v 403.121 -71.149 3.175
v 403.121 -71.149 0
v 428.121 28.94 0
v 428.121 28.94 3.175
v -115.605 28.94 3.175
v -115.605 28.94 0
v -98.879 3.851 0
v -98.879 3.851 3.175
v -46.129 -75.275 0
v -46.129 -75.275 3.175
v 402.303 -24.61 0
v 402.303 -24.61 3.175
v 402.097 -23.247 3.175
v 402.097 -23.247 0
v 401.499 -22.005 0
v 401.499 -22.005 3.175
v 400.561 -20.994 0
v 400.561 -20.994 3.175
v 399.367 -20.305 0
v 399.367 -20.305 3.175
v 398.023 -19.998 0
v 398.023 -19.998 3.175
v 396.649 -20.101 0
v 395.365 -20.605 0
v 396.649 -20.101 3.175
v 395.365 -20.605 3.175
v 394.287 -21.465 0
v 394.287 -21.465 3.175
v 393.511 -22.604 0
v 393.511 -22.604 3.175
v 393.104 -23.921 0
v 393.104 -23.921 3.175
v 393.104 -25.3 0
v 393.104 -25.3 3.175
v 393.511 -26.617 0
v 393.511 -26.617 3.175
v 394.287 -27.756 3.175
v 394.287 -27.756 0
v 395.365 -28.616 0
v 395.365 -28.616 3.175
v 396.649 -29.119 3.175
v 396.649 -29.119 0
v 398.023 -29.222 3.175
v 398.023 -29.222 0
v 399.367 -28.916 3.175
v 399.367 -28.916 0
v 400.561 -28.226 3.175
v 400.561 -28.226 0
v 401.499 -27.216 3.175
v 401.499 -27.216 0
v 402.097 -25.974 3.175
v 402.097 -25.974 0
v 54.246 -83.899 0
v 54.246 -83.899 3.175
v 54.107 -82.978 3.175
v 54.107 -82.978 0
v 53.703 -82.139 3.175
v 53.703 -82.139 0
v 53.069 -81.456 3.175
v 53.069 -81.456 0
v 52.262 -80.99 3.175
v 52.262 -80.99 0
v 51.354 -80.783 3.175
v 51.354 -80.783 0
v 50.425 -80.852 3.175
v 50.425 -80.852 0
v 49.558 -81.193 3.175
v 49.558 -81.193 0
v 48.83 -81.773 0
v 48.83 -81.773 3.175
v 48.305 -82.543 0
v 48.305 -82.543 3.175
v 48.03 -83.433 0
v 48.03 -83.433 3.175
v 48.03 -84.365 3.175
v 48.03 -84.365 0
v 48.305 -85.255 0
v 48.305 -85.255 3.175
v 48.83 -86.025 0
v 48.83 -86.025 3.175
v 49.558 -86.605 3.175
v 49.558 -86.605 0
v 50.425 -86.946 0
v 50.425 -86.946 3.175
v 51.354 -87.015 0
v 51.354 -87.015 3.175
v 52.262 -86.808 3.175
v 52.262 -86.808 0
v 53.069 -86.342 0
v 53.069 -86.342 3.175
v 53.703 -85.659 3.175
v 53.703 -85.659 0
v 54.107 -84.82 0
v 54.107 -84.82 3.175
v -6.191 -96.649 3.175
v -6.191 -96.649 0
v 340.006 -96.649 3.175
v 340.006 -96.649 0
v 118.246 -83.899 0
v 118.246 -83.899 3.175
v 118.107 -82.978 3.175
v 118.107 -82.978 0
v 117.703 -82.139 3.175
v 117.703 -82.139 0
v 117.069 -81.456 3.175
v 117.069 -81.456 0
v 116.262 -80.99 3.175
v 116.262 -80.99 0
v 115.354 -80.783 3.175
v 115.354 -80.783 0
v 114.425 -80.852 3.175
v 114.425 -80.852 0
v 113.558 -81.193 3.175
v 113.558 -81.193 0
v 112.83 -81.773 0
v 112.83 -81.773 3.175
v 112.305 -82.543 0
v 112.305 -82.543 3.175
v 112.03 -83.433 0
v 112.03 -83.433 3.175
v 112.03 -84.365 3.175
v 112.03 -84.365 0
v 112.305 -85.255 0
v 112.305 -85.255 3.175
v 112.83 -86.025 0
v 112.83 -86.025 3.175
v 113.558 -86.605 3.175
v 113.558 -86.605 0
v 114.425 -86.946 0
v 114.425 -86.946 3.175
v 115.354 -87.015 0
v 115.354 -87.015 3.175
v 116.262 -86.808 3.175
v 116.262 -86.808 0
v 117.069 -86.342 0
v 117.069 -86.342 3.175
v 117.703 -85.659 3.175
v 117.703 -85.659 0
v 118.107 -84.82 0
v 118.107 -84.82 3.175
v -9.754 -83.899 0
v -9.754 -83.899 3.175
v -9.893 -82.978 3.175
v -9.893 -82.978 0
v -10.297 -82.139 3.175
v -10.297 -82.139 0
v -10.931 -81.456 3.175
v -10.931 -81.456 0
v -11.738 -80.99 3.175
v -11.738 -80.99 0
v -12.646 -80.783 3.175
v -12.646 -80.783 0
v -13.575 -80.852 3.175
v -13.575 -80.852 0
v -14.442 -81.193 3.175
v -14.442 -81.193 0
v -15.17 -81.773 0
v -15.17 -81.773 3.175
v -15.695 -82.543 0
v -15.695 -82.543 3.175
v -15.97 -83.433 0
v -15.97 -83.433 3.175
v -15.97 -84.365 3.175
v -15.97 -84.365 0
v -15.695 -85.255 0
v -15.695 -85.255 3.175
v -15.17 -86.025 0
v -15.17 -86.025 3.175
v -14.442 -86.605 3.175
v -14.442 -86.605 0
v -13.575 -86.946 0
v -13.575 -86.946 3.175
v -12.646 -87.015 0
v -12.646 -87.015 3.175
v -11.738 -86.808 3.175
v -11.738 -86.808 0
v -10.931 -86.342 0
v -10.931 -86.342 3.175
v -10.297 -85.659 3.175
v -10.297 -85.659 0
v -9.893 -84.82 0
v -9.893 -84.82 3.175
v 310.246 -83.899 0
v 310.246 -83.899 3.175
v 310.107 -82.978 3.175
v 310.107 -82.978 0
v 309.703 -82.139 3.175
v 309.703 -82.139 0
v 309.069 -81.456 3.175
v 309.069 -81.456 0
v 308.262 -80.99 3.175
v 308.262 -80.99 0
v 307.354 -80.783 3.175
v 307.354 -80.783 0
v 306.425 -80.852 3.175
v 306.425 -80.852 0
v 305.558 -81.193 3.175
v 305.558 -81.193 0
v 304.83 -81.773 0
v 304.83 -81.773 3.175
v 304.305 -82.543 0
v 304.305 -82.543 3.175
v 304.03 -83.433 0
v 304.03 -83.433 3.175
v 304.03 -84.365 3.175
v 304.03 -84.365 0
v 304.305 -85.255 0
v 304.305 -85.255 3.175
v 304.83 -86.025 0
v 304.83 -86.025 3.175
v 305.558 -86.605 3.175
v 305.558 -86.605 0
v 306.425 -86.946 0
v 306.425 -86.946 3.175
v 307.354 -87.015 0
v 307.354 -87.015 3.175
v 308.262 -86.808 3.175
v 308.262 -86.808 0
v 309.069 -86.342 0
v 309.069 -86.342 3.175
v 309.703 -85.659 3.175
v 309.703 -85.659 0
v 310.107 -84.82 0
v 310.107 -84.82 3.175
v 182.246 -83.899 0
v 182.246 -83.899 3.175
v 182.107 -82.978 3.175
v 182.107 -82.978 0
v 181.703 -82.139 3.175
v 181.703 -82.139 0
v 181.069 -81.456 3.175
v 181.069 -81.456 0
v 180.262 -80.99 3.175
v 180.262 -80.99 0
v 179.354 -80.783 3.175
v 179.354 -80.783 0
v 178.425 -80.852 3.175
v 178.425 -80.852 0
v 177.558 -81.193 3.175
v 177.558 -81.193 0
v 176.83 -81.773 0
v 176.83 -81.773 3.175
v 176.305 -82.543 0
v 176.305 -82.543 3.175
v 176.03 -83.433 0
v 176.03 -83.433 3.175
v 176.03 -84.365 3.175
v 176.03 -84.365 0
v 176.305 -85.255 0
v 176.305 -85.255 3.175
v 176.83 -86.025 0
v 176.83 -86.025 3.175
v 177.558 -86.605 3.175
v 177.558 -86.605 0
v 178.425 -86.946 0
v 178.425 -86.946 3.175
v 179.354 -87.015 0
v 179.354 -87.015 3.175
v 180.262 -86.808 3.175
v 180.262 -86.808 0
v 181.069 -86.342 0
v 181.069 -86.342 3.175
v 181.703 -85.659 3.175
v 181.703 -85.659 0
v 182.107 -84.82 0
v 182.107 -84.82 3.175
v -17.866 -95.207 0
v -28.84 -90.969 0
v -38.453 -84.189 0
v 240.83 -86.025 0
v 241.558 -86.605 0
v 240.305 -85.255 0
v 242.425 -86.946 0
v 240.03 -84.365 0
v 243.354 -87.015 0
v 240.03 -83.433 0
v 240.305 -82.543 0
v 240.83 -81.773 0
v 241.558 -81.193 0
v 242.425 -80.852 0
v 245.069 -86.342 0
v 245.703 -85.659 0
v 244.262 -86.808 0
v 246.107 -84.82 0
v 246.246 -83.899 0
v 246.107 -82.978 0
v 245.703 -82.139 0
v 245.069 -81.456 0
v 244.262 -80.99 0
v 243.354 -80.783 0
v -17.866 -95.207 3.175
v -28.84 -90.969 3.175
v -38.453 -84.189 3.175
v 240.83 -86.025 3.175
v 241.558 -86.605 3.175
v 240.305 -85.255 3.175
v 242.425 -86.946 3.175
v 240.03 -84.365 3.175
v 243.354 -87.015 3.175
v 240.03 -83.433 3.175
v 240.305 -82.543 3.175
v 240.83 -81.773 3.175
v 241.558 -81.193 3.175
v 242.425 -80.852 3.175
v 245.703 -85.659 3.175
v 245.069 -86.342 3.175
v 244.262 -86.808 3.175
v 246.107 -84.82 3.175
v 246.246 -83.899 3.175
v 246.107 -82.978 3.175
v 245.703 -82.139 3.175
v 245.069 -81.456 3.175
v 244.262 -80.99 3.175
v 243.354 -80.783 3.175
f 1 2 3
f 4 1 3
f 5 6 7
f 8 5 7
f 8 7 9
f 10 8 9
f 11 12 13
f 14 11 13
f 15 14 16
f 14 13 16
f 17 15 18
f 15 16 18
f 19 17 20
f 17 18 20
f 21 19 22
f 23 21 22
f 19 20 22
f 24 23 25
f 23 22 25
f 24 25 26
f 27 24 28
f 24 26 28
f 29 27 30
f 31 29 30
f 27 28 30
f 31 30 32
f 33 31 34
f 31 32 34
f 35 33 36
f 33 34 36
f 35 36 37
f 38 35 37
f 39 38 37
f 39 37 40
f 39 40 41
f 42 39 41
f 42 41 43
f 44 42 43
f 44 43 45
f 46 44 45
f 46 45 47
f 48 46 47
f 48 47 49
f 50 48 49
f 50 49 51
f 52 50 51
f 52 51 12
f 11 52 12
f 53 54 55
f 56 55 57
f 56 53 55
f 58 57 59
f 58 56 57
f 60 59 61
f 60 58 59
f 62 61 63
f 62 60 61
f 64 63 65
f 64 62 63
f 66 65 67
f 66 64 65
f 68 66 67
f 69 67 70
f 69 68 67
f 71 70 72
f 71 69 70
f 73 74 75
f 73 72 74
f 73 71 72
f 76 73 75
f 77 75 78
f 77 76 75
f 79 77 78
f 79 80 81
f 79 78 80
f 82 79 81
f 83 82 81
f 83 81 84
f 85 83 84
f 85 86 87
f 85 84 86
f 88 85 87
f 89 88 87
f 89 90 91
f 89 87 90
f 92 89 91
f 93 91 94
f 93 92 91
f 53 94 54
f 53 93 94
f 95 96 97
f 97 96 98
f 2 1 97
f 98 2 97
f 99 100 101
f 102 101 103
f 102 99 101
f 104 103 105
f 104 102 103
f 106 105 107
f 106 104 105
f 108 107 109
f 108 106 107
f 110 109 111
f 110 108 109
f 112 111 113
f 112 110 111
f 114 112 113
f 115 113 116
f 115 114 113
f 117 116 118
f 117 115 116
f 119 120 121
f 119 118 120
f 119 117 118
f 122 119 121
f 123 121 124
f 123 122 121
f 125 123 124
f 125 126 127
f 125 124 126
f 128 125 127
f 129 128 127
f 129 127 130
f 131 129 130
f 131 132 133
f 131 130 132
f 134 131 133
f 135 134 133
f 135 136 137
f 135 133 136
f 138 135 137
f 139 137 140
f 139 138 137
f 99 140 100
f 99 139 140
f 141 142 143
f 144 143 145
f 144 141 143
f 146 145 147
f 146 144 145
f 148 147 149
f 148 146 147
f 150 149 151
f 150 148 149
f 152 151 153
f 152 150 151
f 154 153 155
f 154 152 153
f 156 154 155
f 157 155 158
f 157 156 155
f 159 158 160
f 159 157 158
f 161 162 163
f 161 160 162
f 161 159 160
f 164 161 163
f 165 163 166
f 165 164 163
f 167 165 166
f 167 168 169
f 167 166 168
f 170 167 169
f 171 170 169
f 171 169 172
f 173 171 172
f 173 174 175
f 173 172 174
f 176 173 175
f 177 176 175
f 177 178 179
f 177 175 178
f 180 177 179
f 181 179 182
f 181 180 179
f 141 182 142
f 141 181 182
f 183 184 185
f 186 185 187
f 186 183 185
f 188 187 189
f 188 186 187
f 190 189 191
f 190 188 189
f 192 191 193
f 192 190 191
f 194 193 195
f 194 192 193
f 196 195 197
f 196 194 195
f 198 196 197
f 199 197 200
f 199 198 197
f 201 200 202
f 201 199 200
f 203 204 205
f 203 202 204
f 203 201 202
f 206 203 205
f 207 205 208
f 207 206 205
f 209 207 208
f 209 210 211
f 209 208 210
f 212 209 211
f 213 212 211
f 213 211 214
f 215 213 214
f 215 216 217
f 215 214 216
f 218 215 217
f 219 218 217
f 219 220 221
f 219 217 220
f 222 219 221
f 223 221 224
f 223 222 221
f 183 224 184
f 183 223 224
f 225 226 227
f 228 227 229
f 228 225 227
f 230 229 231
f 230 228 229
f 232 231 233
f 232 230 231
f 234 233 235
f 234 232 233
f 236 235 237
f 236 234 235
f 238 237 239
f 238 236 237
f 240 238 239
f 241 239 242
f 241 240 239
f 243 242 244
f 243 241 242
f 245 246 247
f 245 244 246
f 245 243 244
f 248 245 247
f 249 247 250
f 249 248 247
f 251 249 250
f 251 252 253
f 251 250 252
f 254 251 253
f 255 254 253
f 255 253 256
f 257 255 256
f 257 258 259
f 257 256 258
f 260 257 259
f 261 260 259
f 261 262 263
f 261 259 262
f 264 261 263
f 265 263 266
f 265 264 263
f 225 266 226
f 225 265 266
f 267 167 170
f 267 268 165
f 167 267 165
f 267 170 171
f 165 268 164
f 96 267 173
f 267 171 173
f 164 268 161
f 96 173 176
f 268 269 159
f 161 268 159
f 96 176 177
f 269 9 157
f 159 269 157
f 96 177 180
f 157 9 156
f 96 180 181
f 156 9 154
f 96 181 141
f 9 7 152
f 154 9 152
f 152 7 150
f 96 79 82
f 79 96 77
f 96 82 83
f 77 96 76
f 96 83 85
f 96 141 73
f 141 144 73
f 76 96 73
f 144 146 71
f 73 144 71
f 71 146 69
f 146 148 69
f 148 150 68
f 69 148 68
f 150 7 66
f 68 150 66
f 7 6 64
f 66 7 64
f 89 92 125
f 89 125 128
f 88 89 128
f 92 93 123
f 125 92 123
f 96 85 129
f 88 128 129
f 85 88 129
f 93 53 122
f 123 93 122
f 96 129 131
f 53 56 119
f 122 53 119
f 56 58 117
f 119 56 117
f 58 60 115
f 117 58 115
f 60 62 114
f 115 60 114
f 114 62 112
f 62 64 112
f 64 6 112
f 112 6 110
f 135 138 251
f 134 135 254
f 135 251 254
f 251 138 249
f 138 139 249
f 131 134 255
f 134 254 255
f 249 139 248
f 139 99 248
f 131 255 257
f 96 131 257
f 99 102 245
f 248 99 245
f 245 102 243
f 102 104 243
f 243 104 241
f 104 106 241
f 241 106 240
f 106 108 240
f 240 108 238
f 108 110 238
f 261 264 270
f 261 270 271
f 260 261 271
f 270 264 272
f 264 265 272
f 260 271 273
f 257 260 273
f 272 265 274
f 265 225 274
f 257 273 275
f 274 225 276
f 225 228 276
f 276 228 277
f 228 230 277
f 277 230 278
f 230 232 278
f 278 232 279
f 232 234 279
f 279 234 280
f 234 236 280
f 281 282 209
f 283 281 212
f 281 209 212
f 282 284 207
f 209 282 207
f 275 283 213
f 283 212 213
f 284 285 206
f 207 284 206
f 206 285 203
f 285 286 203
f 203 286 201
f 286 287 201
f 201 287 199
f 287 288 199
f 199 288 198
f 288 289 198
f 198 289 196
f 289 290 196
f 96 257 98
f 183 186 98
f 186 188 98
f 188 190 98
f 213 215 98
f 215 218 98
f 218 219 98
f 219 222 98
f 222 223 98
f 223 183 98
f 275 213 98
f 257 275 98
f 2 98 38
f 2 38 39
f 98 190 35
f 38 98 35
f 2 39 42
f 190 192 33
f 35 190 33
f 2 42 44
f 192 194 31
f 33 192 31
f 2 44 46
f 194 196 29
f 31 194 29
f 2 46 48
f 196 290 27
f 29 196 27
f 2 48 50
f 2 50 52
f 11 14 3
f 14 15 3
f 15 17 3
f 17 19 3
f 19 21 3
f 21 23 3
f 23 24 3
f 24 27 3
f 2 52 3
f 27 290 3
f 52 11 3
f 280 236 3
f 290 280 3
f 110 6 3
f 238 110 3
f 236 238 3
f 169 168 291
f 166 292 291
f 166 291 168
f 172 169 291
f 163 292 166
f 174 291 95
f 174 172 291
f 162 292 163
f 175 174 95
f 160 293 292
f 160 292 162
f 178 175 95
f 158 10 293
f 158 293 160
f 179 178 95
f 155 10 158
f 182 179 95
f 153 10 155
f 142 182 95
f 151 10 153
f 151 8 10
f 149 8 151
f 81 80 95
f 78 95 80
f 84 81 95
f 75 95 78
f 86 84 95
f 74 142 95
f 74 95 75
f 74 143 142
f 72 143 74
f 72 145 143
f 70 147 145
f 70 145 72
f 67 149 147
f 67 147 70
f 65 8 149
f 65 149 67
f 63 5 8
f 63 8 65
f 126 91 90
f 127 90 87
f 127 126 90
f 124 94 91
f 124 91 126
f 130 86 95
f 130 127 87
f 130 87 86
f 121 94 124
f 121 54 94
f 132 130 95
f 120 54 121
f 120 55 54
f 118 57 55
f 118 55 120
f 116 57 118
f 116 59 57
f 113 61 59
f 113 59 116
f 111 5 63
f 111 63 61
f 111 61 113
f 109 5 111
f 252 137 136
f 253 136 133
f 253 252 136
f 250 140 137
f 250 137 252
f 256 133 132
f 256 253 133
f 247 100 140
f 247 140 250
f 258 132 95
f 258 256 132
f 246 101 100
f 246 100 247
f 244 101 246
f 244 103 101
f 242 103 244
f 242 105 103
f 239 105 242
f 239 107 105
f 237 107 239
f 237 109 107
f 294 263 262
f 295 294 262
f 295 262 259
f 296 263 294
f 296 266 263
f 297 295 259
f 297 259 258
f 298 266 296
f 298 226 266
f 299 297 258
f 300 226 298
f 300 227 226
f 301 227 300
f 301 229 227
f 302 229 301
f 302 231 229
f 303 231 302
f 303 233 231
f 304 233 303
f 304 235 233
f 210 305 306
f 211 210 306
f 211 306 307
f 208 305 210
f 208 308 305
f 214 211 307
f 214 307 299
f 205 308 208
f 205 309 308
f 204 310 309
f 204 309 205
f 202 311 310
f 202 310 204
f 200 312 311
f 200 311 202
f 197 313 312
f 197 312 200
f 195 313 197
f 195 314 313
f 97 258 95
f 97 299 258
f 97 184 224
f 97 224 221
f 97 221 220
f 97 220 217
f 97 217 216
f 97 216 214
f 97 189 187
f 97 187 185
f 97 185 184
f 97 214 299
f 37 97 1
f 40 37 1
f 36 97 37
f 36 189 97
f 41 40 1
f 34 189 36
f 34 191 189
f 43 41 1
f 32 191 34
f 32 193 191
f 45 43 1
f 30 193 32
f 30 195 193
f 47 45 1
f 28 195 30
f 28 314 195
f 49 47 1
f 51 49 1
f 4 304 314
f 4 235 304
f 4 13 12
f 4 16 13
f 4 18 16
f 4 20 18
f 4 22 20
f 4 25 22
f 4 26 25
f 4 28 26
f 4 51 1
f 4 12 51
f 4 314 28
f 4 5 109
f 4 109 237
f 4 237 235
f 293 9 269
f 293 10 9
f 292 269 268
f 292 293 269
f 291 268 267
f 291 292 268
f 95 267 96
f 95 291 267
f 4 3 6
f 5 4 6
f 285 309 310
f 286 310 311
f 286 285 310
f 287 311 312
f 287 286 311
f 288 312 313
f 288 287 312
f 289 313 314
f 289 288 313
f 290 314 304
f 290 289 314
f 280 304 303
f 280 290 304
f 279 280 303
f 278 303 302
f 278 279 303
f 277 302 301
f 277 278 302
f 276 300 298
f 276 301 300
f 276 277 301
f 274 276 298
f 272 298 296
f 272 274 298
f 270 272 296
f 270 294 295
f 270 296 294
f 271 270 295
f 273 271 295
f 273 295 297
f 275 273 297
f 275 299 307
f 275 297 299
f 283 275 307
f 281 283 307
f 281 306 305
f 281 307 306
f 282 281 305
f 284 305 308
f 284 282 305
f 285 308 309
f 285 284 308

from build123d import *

# Parameters (mm, degrees)
BOSS_EXTRUDE1_DEPTH = 3.175
SKETCH1_4_R         = 3.125
CUT_EXTRUDE1_DEPTH  = 439.905857431
FILLET1_R           = 48
CUT_EXTRUDE3_DEPTH  = 10
CUT_EXTRUDE5_REACH  = 440.906
SKETCH12_R          = 4.625


with BuildPart() as part:
    # Sketch1 → Boss-Extrude1 (new body)
    with BuildSketch(Plane.XY):
        Polygon((-98.879411765, 3.850980392), (-31.879411765, -96.649019608), (366, -96.649019608), (403.120588235, -71.149019608), (428.120588235, 28.939617947), (-115.605170134, 28.939617947), align=None)
    extrude(amount=BOSS_EXTRUDE1_DEPTH)

    # Sketch1<4> → Cut-Extrude1 (cut, through all)
    with BuildSketch(Plane.XY):
        with Locations((-12.879411765, -83.899019608)):
            Circle(SKETCH1_4_R)
        with Locations((51.120588235, -83.899019608)):
            Circle(SKETCH1_4_R)
        with Locations((115.120588235, -83.899019608)):
            Circle(SKETCH1_4_R)
        with Locations((179.120588235, -83.899019608)):
            Circle(SKETCH1_4_R)
        with Locations((243.120588235, -83.899019608)):
            Circle(SKETCH1_4_R)
        with Locations((307.120588235, -83.899019608)):
            Circle(SKETCH1_4_R)
    extrude(amount=CUT_EXTRUDE1_DEPTH, mode=Mode.SUBTRACT)

    # Fillet1
    fillet1_edges = [part.edges().sort_by_distance(p)[0] for p in [
        (-31.879411765, -96.649019608, 1.5875),
    ]]
    fillet(fillet1_edges, radius=FILLET1_R)

    # Sketch7 → Cut-Extrude3 (cut)
    with BuildSketch(Plane.XY.offset(3.175)):
        Polygon((403.120588235, -71.149019608), (340.005873473, -96.649019608), (366, -96.649019608), align=None)
    extrude(amount=-CUT_EXTRUDE3_DEPTH, mode=Mode.SUBTRACT)

    # Sketch12 → Cut-Extrude5 (cut, up to next)
    with BuildSketch(Plane.XY.offset(3.175), mode=Mode.PRIVATE) as cut_extrude5_sk1:
        with Locations((397.677759779, -24.610405856)):
            Circle(SKETCH12_R)
    cut_extrude5_tool1 = extrude(cut_extrude5_sk1.sketch, amount=-CUT_EXTRUDE5_REACH, mode=Mode.PRIVATE) & part.part
    add(cut_extrude5_tool1.solids().sort_by_distance((397.67776, -24.610406, 3.175))[0], mode=Mode.SUBTRACT)


solid = part.part
